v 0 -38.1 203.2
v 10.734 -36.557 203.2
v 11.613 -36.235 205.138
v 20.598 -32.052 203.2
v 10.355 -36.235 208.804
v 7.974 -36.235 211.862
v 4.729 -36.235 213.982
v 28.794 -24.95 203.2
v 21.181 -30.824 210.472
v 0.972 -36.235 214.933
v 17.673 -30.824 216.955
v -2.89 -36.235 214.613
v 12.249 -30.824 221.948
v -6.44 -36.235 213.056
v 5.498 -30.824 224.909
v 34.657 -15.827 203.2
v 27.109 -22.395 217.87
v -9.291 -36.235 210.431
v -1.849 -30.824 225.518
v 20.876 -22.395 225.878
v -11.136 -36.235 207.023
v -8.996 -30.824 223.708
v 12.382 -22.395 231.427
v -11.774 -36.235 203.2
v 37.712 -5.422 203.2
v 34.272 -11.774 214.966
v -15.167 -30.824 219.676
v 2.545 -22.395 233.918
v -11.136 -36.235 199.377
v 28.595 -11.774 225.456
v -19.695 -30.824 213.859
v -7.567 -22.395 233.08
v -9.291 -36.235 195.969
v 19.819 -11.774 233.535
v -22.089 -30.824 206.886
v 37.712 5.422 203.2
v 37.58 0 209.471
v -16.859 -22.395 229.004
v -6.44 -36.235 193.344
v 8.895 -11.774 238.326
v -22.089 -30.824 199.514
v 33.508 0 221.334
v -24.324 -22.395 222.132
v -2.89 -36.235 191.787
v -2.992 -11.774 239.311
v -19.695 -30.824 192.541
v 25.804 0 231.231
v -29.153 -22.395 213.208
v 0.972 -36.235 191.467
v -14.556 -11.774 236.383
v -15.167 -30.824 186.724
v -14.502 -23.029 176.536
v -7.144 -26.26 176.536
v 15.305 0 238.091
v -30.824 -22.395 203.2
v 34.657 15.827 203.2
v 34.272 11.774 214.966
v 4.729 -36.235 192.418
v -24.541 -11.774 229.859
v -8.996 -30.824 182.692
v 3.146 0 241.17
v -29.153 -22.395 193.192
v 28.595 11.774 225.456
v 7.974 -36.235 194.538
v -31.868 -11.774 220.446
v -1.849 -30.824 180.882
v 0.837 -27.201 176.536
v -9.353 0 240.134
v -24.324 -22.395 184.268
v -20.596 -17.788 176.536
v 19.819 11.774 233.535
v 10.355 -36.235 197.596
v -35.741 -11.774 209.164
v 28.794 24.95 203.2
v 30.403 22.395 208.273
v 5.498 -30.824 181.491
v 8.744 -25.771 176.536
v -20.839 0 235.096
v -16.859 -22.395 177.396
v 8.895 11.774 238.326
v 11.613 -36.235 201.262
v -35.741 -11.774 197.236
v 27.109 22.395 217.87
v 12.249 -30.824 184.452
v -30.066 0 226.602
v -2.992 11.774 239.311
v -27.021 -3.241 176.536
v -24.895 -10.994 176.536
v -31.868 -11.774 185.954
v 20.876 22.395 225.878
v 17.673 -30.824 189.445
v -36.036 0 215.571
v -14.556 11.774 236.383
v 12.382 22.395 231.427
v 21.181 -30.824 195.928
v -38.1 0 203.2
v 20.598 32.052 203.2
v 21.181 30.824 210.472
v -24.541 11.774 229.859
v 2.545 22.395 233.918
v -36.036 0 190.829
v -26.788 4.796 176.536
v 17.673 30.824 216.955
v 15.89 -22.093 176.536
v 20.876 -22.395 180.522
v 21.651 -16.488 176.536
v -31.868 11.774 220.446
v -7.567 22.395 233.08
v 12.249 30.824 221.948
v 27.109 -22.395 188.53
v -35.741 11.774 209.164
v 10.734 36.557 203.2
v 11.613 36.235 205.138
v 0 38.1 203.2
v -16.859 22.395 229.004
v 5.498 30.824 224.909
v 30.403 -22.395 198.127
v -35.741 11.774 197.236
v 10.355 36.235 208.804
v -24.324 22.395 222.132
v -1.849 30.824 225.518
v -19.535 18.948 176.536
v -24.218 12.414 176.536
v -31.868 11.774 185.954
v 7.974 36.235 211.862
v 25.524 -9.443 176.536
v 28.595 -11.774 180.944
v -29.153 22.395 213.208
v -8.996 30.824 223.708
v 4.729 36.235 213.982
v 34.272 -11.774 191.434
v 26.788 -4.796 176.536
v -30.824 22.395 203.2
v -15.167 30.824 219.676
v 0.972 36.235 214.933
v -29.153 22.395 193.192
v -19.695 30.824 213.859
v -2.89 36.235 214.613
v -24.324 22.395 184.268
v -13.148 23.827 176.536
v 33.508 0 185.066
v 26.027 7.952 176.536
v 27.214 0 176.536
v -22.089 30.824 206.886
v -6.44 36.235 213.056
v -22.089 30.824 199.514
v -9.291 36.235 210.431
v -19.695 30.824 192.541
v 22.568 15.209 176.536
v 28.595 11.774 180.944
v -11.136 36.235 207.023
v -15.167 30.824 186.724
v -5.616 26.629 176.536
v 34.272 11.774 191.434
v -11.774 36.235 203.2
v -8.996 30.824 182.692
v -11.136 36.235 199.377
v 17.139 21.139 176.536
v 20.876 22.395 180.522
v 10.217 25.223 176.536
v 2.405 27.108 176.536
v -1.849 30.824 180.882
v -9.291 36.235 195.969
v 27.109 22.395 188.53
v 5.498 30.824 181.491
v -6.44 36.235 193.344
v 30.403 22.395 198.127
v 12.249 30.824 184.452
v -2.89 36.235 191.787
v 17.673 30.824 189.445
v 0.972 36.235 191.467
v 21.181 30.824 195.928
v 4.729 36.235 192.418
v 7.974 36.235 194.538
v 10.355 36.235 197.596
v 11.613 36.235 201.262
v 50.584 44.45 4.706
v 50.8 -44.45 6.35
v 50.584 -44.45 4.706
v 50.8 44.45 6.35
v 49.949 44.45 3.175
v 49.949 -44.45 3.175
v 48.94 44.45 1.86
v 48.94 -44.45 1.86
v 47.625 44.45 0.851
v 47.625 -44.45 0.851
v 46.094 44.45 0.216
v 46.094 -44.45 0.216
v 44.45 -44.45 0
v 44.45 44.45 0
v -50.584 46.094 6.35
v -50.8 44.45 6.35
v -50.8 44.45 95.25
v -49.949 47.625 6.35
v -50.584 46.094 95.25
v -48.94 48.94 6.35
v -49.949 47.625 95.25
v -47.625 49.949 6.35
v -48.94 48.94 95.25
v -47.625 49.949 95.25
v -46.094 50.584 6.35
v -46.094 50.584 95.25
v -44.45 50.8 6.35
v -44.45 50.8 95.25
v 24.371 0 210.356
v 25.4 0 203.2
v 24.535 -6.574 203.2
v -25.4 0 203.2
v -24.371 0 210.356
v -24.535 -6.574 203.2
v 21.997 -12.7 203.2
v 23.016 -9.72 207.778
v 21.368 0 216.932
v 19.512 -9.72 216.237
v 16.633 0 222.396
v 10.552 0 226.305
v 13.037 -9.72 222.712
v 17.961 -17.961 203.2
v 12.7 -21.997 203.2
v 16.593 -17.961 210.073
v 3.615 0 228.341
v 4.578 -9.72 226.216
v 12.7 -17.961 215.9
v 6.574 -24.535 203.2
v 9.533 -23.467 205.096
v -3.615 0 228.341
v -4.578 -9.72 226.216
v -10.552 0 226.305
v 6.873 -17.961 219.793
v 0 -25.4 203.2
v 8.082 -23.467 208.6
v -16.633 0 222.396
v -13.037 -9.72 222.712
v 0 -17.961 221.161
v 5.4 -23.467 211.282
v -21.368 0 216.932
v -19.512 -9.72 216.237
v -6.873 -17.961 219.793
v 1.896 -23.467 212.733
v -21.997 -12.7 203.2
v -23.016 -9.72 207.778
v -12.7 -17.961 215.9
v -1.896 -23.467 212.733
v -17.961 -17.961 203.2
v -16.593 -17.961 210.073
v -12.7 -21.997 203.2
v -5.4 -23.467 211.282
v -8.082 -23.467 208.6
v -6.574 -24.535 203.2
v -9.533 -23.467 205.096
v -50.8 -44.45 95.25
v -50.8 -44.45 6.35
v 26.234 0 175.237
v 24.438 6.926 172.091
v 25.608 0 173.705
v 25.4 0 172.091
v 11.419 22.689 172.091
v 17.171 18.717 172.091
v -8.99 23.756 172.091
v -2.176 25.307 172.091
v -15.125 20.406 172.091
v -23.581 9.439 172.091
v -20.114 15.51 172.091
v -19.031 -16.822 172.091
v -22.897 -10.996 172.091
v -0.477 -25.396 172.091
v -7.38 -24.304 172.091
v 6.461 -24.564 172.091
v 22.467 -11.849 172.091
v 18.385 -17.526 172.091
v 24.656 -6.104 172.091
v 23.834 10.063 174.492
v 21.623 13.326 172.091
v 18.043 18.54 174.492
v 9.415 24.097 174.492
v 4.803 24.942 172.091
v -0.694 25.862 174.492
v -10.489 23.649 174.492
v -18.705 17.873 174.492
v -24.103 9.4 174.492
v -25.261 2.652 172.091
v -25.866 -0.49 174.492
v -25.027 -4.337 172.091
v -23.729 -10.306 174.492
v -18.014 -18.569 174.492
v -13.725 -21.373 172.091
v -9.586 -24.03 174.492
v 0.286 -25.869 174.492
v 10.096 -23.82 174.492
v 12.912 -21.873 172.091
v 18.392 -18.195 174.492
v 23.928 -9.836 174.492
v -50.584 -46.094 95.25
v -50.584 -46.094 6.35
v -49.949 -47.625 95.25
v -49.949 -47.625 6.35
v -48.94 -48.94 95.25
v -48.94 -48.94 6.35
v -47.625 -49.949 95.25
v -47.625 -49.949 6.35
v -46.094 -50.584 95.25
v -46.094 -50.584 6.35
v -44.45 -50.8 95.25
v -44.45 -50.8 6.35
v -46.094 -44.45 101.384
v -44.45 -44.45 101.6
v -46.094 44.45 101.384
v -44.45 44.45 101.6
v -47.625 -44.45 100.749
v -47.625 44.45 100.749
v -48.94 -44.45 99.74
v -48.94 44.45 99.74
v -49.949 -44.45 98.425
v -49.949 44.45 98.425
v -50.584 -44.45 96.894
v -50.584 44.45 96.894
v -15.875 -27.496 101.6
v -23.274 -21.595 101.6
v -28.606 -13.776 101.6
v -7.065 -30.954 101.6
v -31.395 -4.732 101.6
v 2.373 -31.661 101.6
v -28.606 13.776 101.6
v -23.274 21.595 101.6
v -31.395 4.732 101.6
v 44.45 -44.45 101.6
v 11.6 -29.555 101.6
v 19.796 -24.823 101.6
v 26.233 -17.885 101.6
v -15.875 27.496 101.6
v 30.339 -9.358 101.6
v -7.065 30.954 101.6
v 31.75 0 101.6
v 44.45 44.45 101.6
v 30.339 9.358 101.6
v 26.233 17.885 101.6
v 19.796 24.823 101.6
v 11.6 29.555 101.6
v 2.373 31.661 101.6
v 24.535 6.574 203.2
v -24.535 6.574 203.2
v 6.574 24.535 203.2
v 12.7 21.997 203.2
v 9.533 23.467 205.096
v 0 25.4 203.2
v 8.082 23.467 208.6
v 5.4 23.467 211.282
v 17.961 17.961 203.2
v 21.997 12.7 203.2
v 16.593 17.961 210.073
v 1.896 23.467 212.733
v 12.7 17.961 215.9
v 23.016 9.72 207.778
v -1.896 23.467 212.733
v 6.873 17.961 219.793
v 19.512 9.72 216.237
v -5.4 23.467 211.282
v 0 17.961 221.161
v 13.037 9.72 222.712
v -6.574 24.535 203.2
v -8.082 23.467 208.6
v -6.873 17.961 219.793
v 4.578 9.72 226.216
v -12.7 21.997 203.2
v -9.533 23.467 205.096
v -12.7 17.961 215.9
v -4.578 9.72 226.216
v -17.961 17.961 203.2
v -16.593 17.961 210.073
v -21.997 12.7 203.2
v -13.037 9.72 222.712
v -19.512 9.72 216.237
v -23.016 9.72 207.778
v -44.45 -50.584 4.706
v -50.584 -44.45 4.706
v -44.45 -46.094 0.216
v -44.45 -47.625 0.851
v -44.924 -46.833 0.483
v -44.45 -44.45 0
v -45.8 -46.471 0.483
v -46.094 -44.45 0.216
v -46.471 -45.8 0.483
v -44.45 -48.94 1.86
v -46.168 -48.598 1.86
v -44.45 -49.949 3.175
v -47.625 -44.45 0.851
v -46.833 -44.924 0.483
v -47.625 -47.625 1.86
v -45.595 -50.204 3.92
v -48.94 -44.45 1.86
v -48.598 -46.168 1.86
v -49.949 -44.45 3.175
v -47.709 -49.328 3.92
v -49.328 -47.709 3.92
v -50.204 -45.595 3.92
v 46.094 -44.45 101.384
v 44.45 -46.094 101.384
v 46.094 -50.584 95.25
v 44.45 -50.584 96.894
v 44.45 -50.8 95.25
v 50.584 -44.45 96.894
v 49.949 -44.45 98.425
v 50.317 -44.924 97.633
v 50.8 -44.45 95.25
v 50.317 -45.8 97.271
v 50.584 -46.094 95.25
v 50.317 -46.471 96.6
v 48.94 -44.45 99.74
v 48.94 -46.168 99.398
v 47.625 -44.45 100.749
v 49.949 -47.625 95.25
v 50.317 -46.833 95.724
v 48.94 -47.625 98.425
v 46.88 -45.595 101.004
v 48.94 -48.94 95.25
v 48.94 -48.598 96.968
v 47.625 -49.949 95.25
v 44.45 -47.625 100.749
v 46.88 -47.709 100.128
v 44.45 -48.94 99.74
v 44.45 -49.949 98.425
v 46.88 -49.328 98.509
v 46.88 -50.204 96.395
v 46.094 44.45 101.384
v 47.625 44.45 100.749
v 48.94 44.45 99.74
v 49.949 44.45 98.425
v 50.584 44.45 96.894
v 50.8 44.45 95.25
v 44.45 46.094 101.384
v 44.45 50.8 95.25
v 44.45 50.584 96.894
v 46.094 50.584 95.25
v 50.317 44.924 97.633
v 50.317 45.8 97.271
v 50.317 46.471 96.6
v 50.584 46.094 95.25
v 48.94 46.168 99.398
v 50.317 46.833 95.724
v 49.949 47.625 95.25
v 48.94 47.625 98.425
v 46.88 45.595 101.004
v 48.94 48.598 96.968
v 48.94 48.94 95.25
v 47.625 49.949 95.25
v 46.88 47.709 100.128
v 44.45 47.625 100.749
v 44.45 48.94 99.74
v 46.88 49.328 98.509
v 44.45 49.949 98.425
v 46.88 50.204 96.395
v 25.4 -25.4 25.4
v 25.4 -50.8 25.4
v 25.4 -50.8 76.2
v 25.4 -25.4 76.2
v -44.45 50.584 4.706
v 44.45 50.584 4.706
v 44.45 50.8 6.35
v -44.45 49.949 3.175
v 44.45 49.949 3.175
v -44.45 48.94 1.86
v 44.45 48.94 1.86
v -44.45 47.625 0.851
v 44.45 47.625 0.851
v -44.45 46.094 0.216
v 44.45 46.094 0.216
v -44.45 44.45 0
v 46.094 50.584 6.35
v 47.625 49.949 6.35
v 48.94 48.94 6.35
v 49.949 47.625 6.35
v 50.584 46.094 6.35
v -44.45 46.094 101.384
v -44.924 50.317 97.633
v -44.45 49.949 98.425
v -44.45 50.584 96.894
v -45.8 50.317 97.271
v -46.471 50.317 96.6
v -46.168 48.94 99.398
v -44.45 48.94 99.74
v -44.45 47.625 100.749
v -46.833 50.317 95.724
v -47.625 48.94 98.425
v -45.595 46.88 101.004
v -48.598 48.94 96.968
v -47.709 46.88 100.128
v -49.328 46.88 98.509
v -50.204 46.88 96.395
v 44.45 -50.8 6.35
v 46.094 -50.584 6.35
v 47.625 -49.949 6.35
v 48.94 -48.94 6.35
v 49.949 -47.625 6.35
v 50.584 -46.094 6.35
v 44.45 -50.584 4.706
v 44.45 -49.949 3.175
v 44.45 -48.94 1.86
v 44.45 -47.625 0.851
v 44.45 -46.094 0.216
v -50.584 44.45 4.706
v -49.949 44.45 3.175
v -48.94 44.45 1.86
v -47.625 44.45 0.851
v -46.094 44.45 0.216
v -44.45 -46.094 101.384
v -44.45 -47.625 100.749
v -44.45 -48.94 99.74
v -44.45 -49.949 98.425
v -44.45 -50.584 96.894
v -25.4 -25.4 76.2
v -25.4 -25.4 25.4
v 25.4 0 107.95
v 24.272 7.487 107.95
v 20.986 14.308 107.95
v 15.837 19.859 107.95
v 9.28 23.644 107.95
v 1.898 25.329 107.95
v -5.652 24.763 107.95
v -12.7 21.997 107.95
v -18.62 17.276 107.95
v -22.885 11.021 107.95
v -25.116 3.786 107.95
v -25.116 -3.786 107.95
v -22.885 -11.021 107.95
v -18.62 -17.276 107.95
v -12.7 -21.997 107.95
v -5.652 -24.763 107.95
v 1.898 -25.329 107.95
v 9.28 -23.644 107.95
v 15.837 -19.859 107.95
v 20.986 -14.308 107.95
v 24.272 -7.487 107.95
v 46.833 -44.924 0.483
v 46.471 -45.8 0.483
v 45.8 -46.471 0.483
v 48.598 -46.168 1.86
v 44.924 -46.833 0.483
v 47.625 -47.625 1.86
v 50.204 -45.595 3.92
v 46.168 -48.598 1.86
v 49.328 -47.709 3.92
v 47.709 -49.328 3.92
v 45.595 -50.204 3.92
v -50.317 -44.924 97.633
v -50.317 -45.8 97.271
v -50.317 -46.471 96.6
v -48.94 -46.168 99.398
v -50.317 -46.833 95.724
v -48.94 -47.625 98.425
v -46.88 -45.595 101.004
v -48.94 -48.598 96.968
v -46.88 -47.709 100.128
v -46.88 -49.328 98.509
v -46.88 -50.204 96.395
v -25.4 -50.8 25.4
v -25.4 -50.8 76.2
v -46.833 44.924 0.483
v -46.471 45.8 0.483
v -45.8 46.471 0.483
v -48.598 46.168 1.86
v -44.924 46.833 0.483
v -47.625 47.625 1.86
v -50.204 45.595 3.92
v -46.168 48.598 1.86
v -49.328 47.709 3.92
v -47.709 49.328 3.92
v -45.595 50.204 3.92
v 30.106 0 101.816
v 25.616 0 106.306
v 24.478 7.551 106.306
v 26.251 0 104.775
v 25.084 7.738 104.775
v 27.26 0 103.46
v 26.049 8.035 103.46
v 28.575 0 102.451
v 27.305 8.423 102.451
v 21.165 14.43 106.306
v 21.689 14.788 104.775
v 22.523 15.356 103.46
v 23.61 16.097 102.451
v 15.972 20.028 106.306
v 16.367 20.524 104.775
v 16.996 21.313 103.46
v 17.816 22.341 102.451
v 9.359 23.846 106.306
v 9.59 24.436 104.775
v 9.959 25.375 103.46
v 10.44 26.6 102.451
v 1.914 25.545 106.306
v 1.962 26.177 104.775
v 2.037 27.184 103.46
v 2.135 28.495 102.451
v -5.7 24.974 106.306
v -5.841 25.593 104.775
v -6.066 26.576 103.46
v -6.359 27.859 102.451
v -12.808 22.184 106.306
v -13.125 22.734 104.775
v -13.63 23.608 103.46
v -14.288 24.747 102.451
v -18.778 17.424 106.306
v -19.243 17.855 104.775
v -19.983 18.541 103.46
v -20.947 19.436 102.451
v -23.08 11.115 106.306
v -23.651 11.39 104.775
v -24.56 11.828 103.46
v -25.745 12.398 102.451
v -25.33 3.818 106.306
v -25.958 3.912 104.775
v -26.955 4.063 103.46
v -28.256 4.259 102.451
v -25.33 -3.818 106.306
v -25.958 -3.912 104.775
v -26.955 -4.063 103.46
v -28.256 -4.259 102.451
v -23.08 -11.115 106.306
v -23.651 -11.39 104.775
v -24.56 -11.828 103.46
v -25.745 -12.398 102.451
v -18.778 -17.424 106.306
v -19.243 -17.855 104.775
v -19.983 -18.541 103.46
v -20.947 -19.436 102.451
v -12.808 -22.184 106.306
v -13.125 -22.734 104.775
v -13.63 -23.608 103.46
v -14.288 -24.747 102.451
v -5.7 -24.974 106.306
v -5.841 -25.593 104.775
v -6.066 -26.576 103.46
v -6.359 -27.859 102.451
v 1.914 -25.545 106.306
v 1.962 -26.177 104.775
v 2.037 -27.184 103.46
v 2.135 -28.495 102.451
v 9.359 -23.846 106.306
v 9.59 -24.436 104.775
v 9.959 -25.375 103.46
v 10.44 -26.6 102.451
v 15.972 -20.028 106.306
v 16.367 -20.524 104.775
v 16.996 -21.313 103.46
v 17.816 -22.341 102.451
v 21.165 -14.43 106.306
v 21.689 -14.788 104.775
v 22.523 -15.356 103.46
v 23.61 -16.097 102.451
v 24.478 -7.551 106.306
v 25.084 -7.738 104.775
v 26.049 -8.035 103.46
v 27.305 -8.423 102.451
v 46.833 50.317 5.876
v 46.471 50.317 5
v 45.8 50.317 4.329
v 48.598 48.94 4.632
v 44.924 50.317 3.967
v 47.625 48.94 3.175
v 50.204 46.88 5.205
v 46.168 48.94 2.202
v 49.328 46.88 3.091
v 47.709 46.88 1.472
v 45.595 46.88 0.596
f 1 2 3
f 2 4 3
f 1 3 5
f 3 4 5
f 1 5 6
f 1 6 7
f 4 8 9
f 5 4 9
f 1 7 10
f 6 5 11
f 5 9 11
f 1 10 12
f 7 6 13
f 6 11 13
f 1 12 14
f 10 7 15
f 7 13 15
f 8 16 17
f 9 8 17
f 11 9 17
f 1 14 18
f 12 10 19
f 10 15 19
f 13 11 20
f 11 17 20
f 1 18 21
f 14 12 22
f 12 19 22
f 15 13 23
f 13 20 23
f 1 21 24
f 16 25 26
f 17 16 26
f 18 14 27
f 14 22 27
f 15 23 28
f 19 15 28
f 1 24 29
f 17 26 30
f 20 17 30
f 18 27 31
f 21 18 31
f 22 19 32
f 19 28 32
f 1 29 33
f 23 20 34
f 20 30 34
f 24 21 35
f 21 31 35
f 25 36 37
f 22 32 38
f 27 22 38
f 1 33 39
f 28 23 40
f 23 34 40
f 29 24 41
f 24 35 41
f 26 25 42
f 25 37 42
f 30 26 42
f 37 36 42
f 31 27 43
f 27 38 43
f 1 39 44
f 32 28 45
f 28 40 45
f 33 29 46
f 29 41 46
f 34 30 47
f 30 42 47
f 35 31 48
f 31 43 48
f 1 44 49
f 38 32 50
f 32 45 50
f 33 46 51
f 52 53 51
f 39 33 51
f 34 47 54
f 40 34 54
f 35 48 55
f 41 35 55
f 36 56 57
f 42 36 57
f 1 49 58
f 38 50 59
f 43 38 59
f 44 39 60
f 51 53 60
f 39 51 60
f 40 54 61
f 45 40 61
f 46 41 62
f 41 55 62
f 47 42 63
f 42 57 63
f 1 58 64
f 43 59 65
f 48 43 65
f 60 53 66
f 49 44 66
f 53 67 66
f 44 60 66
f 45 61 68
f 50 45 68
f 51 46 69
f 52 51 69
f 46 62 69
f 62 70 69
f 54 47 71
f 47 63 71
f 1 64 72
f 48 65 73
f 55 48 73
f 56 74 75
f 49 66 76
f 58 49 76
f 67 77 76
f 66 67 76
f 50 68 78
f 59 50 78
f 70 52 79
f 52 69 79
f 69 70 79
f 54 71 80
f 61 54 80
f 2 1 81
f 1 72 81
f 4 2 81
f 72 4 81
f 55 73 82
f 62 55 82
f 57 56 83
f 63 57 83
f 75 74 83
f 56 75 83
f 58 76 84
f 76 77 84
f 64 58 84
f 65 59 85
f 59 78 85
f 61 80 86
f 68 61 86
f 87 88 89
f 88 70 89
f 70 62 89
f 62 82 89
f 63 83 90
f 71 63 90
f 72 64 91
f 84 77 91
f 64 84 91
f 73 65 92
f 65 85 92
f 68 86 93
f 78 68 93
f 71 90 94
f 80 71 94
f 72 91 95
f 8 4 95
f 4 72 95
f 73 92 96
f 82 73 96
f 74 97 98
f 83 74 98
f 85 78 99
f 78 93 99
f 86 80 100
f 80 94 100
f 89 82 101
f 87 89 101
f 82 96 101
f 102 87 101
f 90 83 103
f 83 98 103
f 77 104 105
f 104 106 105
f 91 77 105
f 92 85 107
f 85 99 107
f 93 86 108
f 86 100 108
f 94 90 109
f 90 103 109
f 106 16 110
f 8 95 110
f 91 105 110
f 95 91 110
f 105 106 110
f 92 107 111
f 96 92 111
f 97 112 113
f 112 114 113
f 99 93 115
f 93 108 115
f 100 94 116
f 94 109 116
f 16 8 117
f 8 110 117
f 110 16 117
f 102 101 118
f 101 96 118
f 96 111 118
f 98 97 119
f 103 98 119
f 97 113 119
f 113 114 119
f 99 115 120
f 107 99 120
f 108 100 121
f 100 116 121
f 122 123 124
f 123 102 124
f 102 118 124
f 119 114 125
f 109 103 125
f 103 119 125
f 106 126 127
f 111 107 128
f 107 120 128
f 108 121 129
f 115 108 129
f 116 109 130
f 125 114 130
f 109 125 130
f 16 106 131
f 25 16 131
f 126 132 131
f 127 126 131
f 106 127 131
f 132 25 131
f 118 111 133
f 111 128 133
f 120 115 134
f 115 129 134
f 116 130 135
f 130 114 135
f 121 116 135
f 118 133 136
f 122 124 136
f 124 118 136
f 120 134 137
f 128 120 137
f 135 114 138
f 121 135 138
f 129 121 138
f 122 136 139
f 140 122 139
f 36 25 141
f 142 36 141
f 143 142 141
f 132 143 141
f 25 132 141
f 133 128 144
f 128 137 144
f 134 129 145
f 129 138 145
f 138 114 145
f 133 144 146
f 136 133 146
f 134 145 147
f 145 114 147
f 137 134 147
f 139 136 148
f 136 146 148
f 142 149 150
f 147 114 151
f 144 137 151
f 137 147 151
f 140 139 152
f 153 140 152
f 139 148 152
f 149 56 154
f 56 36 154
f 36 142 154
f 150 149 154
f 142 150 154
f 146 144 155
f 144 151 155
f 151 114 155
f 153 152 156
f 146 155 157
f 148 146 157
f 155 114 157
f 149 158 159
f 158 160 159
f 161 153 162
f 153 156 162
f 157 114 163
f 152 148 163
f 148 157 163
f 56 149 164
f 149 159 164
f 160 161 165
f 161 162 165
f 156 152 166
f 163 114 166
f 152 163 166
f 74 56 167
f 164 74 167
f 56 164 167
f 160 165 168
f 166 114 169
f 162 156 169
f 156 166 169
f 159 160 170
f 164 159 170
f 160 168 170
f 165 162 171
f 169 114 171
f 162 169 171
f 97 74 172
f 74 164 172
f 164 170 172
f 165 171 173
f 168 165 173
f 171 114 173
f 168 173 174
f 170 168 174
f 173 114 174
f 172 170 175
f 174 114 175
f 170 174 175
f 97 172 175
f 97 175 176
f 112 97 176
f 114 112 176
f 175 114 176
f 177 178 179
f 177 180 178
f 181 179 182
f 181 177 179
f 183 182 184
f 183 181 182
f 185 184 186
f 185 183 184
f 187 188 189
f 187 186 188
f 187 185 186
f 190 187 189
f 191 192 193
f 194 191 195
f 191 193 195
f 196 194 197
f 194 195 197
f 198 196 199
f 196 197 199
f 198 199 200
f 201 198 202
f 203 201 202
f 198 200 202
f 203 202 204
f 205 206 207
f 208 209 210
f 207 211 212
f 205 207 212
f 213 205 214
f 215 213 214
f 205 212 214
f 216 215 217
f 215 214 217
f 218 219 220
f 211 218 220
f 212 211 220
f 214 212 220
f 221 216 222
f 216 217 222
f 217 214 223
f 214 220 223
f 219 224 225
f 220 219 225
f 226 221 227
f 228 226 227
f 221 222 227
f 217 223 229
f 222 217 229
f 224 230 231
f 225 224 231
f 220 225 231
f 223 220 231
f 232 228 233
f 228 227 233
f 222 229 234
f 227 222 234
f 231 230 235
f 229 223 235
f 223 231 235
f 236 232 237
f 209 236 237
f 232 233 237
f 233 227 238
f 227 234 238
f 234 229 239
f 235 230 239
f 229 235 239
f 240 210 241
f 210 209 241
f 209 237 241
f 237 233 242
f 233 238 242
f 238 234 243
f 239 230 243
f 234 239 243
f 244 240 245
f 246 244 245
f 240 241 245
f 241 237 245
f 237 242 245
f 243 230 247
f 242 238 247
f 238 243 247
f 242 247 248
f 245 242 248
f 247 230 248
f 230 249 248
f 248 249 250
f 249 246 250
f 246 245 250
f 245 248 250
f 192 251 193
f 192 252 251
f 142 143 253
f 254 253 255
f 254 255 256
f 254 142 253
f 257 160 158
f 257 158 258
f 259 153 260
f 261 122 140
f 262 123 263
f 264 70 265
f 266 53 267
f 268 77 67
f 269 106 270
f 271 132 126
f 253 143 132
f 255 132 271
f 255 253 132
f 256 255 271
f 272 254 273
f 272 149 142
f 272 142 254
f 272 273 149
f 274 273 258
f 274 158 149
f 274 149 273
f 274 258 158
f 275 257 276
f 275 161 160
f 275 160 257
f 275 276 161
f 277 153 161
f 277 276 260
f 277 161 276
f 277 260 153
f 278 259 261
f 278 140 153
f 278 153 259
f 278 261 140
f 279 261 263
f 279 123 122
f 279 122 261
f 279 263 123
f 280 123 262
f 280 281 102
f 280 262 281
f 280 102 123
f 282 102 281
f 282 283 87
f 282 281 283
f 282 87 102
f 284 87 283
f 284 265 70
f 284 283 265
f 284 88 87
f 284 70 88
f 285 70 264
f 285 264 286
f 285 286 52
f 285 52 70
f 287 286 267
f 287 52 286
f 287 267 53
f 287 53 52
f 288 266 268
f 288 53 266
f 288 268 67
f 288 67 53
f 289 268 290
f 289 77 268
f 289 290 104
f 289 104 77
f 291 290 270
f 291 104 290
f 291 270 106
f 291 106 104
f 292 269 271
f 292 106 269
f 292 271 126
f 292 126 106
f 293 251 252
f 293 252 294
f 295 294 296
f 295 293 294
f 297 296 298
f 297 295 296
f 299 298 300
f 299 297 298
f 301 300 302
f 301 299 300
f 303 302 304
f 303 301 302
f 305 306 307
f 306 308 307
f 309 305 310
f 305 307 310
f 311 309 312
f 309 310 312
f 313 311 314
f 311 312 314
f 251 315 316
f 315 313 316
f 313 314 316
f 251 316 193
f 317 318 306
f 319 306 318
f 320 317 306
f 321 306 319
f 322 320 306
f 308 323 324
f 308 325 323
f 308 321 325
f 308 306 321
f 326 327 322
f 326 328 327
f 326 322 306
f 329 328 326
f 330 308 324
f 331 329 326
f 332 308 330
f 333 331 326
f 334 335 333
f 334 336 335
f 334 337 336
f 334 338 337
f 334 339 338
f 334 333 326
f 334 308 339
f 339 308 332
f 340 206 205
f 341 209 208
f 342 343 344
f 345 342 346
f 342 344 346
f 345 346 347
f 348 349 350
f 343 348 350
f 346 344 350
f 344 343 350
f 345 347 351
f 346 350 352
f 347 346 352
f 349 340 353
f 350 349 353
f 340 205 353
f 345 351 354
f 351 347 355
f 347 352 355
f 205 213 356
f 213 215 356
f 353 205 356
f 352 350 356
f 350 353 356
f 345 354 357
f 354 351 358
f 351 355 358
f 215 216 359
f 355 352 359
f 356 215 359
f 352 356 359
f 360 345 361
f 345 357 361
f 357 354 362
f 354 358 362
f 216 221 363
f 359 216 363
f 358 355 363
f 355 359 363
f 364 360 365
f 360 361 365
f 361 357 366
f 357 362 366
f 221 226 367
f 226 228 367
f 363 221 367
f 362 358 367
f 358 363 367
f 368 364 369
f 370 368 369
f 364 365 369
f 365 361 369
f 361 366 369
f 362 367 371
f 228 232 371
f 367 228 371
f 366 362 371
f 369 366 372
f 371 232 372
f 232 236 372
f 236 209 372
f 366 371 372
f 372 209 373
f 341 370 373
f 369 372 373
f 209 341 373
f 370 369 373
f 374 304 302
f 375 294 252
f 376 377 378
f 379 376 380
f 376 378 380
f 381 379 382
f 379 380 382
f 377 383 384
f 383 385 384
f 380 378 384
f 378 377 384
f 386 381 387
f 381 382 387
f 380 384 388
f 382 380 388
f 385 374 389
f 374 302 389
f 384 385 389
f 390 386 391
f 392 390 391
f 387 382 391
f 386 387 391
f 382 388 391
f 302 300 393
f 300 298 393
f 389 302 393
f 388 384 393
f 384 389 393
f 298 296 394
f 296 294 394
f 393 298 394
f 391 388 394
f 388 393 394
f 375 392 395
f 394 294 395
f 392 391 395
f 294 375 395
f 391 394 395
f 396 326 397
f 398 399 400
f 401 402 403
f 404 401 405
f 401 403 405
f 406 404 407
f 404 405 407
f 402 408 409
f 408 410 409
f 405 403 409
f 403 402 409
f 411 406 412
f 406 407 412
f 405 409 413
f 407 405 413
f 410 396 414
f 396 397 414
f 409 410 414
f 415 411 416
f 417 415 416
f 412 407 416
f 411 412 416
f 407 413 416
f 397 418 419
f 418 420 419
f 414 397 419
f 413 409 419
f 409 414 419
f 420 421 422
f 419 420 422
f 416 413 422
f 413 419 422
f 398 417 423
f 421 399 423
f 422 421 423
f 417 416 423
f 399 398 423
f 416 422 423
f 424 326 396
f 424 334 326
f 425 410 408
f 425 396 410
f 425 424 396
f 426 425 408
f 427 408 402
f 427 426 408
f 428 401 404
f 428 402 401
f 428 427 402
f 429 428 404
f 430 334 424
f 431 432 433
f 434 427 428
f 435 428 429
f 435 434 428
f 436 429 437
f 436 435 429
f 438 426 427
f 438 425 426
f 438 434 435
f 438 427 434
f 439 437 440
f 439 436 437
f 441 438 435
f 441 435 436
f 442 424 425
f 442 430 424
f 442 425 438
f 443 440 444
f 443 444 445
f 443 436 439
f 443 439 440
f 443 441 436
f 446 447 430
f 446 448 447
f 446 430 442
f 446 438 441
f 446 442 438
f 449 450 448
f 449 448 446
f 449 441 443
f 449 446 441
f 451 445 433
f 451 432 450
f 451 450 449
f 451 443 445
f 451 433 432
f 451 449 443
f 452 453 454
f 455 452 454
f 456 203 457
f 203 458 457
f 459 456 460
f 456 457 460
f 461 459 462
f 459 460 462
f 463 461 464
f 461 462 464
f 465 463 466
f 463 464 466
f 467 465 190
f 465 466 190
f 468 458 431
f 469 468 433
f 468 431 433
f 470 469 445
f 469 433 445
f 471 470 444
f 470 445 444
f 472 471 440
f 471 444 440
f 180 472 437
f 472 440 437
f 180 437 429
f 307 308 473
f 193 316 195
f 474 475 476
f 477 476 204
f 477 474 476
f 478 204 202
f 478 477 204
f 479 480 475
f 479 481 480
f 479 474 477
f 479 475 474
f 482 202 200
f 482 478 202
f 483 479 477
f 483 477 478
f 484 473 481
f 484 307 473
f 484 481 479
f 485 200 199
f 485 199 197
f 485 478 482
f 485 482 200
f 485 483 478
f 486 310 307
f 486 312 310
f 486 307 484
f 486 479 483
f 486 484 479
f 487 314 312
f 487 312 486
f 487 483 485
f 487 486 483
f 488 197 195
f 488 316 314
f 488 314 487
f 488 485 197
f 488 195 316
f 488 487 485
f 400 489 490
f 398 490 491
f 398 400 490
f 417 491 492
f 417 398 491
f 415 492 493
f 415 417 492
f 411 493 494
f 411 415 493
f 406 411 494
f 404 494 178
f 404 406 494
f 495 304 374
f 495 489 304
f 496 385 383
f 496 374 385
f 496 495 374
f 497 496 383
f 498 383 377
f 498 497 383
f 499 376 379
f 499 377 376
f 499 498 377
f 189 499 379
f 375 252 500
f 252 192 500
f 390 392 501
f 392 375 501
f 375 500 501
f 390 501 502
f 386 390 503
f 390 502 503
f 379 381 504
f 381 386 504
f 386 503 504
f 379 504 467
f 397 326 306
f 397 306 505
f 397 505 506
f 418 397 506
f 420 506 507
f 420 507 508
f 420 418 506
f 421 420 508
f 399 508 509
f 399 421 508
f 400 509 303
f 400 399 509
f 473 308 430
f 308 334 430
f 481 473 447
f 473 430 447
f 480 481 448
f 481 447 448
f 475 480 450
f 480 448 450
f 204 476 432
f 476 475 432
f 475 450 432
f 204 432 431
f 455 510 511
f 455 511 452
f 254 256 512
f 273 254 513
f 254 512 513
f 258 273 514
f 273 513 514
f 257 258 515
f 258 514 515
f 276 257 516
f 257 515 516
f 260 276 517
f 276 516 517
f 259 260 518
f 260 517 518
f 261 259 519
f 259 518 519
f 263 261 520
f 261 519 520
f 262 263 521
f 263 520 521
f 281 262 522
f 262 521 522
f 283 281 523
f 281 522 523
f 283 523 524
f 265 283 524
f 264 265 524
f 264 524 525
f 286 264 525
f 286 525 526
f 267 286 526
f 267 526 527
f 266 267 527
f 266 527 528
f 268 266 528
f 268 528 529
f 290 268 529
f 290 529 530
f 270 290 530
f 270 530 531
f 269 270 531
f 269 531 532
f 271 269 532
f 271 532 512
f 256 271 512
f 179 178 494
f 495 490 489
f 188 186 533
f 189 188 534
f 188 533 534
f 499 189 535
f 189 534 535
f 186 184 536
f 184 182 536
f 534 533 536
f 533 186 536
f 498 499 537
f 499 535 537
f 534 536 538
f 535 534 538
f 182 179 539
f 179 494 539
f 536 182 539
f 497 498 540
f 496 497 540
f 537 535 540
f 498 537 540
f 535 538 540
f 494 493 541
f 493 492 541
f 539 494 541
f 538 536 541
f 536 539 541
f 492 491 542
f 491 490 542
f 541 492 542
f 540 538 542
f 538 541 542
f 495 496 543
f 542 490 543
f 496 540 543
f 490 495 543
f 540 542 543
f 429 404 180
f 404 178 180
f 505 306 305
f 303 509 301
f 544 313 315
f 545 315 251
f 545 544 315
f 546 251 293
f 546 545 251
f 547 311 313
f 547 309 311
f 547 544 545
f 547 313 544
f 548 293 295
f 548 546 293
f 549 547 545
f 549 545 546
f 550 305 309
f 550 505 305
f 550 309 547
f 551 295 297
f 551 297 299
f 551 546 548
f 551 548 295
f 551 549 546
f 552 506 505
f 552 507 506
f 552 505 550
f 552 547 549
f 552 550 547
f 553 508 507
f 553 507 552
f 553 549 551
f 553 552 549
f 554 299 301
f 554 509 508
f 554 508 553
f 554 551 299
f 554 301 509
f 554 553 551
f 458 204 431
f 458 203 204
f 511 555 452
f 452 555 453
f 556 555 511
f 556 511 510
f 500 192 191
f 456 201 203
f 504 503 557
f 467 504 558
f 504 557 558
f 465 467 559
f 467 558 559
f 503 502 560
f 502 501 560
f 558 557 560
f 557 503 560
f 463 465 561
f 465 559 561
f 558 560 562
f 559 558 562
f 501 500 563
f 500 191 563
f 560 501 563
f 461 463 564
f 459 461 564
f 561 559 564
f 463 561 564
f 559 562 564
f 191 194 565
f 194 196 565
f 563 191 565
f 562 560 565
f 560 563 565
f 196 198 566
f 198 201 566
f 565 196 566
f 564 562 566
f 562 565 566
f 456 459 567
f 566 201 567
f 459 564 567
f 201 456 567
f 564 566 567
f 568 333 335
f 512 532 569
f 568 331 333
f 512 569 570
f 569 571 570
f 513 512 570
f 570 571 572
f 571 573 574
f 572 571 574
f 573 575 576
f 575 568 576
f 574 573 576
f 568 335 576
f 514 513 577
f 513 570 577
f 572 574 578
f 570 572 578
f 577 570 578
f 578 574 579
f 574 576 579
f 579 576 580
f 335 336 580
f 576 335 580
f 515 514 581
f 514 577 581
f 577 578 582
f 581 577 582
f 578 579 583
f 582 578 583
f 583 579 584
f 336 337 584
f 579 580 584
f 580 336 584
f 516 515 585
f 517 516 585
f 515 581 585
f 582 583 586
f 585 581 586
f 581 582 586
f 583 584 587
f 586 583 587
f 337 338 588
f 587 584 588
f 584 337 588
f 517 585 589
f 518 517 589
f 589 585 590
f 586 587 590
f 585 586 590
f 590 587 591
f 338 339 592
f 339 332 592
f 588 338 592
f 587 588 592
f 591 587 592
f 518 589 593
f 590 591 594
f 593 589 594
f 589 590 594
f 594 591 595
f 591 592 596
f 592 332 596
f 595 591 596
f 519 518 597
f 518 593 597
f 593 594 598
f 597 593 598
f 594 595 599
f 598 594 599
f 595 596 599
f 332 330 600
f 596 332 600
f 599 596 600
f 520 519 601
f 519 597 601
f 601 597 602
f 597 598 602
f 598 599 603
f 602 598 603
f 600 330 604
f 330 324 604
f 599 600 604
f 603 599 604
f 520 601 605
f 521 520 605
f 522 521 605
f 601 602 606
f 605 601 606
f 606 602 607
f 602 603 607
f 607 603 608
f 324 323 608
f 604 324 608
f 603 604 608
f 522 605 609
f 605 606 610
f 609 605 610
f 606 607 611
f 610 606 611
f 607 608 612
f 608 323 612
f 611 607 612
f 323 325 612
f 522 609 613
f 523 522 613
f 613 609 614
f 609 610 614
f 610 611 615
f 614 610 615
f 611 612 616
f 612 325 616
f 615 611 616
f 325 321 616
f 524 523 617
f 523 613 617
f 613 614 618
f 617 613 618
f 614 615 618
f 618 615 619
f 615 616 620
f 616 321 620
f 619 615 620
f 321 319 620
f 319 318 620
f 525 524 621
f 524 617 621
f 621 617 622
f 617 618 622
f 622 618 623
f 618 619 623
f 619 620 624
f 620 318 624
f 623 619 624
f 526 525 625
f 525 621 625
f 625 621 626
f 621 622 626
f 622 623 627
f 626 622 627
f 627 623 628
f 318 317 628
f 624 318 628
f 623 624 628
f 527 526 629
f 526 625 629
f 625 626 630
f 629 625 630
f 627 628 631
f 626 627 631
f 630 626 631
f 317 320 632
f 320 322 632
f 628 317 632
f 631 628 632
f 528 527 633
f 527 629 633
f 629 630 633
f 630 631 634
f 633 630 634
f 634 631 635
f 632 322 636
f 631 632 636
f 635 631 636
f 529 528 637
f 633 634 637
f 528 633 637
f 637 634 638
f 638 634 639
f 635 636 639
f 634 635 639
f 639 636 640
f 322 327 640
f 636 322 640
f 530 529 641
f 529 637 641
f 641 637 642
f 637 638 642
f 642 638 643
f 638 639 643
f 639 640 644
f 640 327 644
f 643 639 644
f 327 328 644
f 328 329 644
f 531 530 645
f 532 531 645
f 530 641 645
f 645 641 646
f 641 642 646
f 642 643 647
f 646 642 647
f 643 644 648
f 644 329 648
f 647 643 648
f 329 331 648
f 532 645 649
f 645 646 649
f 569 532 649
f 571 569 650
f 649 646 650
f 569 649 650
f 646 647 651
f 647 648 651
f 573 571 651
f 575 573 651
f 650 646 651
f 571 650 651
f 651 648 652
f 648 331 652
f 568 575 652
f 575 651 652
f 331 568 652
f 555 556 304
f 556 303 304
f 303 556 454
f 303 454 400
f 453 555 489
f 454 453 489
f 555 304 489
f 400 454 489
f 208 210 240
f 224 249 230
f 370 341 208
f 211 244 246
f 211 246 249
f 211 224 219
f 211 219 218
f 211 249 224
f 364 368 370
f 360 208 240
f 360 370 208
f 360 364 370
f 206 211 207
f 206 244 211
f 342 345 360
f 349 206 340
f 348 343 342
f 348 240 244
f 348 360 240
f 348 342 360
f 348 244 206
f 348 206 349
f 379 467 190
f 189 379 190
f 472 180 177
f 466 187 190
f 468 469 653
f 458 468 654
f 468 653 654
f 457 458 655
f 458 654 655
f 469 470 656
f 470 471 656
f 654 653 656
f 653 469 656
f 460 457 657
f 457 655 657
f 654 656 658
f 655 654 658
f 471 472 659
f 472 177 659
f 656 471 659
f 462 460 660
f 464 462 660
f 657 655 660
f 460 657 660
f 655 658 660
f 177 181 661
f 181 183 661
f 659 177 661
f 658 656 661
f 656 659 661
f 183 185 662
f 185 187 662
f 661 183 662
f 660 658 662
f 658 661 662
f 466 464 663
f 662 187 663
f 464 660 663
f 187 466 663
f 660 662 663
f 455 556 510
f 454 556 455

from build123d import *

# Parameters (mm, degrees)
F0_W     = 101.6
F0_H     = 101.6
F1_DEPTH = 101.6
F2_R     = 25.4
F3_DEPTH = 101.6
F4_W     = 50.8
F4_H     = 50.8
F5_DEPTH = 25.4
F8_R     = 6.35


with BuildPart() as f1:
    # F0 (on Top) → F1 (new body)
    with BuildSketch(Plane.XY):
        Rectangle(F0_W, F0_H)
    extrude(amount=F1_DEPTH)

    # F2 (on face) → F3 (join)
    with BuildSketch(Plane.XY.offset(101.6)):
        Circle(F2_R)
    extrude(amount=F3_DEPTH)

    # F4 (on face) → F5 (cut)
    with BuildSketch(Plane.XZ.offset(50.8)):
        with Locations((0, 50.8)):
            Rectangle(F4_W, F4_H)
    extrude(amount=-F5_DEPTH, mode=Mode.SUBTRACT)

    # F6 (on face) → F7 (revolve)
    with BuildSketch(Plane.XY.offset(203.2)):
        with BuildLine():
            Line((0, -25.4), (0, -38.1))
            ThreePointArc((0, -38.1), (38.1, 0), (0, 38.1))
            Line((0, 38.1), (0, 25.4))
            ThreePointArc((0, 25.4), (17.9605122421, 17.9605122421), (25.4, 0))
            ThreePointArc((25.4, 0), (17.9605122421, -17.9605122421), (0, -25.4))
        make_face()
    revolve(axis=Axis((0, 0, 203.2), (0, -1, 0)))

    # F8
    f8_edges = [f1.edges().sort_by_distance(p)[0] for p in [
        (0, -50.8, 101.6),
        (-50.8, 0, 101.6),
        (0, 50.8, 101.6),
        (50.8, 0, 101.6),
        (50.8, -50.8, 50.8),
        (-50.8, -50.8, 50.8),
        (50.8, 0, 0),
        (0, -50.8, 0),
        (50.8, 50.8, 50.8),
        (-25.4, 0, 174.801937),
        (-25.4, 0, 101.6),
        (25.4, 0, 138.200968),
        (-50.8, 50.8, 50.8),
        (-50.8, 0, 0),
        (0, 50.8, 0),
    ]]
    fillet(f8_edges, radius=F8_R)


solid = f1.part
